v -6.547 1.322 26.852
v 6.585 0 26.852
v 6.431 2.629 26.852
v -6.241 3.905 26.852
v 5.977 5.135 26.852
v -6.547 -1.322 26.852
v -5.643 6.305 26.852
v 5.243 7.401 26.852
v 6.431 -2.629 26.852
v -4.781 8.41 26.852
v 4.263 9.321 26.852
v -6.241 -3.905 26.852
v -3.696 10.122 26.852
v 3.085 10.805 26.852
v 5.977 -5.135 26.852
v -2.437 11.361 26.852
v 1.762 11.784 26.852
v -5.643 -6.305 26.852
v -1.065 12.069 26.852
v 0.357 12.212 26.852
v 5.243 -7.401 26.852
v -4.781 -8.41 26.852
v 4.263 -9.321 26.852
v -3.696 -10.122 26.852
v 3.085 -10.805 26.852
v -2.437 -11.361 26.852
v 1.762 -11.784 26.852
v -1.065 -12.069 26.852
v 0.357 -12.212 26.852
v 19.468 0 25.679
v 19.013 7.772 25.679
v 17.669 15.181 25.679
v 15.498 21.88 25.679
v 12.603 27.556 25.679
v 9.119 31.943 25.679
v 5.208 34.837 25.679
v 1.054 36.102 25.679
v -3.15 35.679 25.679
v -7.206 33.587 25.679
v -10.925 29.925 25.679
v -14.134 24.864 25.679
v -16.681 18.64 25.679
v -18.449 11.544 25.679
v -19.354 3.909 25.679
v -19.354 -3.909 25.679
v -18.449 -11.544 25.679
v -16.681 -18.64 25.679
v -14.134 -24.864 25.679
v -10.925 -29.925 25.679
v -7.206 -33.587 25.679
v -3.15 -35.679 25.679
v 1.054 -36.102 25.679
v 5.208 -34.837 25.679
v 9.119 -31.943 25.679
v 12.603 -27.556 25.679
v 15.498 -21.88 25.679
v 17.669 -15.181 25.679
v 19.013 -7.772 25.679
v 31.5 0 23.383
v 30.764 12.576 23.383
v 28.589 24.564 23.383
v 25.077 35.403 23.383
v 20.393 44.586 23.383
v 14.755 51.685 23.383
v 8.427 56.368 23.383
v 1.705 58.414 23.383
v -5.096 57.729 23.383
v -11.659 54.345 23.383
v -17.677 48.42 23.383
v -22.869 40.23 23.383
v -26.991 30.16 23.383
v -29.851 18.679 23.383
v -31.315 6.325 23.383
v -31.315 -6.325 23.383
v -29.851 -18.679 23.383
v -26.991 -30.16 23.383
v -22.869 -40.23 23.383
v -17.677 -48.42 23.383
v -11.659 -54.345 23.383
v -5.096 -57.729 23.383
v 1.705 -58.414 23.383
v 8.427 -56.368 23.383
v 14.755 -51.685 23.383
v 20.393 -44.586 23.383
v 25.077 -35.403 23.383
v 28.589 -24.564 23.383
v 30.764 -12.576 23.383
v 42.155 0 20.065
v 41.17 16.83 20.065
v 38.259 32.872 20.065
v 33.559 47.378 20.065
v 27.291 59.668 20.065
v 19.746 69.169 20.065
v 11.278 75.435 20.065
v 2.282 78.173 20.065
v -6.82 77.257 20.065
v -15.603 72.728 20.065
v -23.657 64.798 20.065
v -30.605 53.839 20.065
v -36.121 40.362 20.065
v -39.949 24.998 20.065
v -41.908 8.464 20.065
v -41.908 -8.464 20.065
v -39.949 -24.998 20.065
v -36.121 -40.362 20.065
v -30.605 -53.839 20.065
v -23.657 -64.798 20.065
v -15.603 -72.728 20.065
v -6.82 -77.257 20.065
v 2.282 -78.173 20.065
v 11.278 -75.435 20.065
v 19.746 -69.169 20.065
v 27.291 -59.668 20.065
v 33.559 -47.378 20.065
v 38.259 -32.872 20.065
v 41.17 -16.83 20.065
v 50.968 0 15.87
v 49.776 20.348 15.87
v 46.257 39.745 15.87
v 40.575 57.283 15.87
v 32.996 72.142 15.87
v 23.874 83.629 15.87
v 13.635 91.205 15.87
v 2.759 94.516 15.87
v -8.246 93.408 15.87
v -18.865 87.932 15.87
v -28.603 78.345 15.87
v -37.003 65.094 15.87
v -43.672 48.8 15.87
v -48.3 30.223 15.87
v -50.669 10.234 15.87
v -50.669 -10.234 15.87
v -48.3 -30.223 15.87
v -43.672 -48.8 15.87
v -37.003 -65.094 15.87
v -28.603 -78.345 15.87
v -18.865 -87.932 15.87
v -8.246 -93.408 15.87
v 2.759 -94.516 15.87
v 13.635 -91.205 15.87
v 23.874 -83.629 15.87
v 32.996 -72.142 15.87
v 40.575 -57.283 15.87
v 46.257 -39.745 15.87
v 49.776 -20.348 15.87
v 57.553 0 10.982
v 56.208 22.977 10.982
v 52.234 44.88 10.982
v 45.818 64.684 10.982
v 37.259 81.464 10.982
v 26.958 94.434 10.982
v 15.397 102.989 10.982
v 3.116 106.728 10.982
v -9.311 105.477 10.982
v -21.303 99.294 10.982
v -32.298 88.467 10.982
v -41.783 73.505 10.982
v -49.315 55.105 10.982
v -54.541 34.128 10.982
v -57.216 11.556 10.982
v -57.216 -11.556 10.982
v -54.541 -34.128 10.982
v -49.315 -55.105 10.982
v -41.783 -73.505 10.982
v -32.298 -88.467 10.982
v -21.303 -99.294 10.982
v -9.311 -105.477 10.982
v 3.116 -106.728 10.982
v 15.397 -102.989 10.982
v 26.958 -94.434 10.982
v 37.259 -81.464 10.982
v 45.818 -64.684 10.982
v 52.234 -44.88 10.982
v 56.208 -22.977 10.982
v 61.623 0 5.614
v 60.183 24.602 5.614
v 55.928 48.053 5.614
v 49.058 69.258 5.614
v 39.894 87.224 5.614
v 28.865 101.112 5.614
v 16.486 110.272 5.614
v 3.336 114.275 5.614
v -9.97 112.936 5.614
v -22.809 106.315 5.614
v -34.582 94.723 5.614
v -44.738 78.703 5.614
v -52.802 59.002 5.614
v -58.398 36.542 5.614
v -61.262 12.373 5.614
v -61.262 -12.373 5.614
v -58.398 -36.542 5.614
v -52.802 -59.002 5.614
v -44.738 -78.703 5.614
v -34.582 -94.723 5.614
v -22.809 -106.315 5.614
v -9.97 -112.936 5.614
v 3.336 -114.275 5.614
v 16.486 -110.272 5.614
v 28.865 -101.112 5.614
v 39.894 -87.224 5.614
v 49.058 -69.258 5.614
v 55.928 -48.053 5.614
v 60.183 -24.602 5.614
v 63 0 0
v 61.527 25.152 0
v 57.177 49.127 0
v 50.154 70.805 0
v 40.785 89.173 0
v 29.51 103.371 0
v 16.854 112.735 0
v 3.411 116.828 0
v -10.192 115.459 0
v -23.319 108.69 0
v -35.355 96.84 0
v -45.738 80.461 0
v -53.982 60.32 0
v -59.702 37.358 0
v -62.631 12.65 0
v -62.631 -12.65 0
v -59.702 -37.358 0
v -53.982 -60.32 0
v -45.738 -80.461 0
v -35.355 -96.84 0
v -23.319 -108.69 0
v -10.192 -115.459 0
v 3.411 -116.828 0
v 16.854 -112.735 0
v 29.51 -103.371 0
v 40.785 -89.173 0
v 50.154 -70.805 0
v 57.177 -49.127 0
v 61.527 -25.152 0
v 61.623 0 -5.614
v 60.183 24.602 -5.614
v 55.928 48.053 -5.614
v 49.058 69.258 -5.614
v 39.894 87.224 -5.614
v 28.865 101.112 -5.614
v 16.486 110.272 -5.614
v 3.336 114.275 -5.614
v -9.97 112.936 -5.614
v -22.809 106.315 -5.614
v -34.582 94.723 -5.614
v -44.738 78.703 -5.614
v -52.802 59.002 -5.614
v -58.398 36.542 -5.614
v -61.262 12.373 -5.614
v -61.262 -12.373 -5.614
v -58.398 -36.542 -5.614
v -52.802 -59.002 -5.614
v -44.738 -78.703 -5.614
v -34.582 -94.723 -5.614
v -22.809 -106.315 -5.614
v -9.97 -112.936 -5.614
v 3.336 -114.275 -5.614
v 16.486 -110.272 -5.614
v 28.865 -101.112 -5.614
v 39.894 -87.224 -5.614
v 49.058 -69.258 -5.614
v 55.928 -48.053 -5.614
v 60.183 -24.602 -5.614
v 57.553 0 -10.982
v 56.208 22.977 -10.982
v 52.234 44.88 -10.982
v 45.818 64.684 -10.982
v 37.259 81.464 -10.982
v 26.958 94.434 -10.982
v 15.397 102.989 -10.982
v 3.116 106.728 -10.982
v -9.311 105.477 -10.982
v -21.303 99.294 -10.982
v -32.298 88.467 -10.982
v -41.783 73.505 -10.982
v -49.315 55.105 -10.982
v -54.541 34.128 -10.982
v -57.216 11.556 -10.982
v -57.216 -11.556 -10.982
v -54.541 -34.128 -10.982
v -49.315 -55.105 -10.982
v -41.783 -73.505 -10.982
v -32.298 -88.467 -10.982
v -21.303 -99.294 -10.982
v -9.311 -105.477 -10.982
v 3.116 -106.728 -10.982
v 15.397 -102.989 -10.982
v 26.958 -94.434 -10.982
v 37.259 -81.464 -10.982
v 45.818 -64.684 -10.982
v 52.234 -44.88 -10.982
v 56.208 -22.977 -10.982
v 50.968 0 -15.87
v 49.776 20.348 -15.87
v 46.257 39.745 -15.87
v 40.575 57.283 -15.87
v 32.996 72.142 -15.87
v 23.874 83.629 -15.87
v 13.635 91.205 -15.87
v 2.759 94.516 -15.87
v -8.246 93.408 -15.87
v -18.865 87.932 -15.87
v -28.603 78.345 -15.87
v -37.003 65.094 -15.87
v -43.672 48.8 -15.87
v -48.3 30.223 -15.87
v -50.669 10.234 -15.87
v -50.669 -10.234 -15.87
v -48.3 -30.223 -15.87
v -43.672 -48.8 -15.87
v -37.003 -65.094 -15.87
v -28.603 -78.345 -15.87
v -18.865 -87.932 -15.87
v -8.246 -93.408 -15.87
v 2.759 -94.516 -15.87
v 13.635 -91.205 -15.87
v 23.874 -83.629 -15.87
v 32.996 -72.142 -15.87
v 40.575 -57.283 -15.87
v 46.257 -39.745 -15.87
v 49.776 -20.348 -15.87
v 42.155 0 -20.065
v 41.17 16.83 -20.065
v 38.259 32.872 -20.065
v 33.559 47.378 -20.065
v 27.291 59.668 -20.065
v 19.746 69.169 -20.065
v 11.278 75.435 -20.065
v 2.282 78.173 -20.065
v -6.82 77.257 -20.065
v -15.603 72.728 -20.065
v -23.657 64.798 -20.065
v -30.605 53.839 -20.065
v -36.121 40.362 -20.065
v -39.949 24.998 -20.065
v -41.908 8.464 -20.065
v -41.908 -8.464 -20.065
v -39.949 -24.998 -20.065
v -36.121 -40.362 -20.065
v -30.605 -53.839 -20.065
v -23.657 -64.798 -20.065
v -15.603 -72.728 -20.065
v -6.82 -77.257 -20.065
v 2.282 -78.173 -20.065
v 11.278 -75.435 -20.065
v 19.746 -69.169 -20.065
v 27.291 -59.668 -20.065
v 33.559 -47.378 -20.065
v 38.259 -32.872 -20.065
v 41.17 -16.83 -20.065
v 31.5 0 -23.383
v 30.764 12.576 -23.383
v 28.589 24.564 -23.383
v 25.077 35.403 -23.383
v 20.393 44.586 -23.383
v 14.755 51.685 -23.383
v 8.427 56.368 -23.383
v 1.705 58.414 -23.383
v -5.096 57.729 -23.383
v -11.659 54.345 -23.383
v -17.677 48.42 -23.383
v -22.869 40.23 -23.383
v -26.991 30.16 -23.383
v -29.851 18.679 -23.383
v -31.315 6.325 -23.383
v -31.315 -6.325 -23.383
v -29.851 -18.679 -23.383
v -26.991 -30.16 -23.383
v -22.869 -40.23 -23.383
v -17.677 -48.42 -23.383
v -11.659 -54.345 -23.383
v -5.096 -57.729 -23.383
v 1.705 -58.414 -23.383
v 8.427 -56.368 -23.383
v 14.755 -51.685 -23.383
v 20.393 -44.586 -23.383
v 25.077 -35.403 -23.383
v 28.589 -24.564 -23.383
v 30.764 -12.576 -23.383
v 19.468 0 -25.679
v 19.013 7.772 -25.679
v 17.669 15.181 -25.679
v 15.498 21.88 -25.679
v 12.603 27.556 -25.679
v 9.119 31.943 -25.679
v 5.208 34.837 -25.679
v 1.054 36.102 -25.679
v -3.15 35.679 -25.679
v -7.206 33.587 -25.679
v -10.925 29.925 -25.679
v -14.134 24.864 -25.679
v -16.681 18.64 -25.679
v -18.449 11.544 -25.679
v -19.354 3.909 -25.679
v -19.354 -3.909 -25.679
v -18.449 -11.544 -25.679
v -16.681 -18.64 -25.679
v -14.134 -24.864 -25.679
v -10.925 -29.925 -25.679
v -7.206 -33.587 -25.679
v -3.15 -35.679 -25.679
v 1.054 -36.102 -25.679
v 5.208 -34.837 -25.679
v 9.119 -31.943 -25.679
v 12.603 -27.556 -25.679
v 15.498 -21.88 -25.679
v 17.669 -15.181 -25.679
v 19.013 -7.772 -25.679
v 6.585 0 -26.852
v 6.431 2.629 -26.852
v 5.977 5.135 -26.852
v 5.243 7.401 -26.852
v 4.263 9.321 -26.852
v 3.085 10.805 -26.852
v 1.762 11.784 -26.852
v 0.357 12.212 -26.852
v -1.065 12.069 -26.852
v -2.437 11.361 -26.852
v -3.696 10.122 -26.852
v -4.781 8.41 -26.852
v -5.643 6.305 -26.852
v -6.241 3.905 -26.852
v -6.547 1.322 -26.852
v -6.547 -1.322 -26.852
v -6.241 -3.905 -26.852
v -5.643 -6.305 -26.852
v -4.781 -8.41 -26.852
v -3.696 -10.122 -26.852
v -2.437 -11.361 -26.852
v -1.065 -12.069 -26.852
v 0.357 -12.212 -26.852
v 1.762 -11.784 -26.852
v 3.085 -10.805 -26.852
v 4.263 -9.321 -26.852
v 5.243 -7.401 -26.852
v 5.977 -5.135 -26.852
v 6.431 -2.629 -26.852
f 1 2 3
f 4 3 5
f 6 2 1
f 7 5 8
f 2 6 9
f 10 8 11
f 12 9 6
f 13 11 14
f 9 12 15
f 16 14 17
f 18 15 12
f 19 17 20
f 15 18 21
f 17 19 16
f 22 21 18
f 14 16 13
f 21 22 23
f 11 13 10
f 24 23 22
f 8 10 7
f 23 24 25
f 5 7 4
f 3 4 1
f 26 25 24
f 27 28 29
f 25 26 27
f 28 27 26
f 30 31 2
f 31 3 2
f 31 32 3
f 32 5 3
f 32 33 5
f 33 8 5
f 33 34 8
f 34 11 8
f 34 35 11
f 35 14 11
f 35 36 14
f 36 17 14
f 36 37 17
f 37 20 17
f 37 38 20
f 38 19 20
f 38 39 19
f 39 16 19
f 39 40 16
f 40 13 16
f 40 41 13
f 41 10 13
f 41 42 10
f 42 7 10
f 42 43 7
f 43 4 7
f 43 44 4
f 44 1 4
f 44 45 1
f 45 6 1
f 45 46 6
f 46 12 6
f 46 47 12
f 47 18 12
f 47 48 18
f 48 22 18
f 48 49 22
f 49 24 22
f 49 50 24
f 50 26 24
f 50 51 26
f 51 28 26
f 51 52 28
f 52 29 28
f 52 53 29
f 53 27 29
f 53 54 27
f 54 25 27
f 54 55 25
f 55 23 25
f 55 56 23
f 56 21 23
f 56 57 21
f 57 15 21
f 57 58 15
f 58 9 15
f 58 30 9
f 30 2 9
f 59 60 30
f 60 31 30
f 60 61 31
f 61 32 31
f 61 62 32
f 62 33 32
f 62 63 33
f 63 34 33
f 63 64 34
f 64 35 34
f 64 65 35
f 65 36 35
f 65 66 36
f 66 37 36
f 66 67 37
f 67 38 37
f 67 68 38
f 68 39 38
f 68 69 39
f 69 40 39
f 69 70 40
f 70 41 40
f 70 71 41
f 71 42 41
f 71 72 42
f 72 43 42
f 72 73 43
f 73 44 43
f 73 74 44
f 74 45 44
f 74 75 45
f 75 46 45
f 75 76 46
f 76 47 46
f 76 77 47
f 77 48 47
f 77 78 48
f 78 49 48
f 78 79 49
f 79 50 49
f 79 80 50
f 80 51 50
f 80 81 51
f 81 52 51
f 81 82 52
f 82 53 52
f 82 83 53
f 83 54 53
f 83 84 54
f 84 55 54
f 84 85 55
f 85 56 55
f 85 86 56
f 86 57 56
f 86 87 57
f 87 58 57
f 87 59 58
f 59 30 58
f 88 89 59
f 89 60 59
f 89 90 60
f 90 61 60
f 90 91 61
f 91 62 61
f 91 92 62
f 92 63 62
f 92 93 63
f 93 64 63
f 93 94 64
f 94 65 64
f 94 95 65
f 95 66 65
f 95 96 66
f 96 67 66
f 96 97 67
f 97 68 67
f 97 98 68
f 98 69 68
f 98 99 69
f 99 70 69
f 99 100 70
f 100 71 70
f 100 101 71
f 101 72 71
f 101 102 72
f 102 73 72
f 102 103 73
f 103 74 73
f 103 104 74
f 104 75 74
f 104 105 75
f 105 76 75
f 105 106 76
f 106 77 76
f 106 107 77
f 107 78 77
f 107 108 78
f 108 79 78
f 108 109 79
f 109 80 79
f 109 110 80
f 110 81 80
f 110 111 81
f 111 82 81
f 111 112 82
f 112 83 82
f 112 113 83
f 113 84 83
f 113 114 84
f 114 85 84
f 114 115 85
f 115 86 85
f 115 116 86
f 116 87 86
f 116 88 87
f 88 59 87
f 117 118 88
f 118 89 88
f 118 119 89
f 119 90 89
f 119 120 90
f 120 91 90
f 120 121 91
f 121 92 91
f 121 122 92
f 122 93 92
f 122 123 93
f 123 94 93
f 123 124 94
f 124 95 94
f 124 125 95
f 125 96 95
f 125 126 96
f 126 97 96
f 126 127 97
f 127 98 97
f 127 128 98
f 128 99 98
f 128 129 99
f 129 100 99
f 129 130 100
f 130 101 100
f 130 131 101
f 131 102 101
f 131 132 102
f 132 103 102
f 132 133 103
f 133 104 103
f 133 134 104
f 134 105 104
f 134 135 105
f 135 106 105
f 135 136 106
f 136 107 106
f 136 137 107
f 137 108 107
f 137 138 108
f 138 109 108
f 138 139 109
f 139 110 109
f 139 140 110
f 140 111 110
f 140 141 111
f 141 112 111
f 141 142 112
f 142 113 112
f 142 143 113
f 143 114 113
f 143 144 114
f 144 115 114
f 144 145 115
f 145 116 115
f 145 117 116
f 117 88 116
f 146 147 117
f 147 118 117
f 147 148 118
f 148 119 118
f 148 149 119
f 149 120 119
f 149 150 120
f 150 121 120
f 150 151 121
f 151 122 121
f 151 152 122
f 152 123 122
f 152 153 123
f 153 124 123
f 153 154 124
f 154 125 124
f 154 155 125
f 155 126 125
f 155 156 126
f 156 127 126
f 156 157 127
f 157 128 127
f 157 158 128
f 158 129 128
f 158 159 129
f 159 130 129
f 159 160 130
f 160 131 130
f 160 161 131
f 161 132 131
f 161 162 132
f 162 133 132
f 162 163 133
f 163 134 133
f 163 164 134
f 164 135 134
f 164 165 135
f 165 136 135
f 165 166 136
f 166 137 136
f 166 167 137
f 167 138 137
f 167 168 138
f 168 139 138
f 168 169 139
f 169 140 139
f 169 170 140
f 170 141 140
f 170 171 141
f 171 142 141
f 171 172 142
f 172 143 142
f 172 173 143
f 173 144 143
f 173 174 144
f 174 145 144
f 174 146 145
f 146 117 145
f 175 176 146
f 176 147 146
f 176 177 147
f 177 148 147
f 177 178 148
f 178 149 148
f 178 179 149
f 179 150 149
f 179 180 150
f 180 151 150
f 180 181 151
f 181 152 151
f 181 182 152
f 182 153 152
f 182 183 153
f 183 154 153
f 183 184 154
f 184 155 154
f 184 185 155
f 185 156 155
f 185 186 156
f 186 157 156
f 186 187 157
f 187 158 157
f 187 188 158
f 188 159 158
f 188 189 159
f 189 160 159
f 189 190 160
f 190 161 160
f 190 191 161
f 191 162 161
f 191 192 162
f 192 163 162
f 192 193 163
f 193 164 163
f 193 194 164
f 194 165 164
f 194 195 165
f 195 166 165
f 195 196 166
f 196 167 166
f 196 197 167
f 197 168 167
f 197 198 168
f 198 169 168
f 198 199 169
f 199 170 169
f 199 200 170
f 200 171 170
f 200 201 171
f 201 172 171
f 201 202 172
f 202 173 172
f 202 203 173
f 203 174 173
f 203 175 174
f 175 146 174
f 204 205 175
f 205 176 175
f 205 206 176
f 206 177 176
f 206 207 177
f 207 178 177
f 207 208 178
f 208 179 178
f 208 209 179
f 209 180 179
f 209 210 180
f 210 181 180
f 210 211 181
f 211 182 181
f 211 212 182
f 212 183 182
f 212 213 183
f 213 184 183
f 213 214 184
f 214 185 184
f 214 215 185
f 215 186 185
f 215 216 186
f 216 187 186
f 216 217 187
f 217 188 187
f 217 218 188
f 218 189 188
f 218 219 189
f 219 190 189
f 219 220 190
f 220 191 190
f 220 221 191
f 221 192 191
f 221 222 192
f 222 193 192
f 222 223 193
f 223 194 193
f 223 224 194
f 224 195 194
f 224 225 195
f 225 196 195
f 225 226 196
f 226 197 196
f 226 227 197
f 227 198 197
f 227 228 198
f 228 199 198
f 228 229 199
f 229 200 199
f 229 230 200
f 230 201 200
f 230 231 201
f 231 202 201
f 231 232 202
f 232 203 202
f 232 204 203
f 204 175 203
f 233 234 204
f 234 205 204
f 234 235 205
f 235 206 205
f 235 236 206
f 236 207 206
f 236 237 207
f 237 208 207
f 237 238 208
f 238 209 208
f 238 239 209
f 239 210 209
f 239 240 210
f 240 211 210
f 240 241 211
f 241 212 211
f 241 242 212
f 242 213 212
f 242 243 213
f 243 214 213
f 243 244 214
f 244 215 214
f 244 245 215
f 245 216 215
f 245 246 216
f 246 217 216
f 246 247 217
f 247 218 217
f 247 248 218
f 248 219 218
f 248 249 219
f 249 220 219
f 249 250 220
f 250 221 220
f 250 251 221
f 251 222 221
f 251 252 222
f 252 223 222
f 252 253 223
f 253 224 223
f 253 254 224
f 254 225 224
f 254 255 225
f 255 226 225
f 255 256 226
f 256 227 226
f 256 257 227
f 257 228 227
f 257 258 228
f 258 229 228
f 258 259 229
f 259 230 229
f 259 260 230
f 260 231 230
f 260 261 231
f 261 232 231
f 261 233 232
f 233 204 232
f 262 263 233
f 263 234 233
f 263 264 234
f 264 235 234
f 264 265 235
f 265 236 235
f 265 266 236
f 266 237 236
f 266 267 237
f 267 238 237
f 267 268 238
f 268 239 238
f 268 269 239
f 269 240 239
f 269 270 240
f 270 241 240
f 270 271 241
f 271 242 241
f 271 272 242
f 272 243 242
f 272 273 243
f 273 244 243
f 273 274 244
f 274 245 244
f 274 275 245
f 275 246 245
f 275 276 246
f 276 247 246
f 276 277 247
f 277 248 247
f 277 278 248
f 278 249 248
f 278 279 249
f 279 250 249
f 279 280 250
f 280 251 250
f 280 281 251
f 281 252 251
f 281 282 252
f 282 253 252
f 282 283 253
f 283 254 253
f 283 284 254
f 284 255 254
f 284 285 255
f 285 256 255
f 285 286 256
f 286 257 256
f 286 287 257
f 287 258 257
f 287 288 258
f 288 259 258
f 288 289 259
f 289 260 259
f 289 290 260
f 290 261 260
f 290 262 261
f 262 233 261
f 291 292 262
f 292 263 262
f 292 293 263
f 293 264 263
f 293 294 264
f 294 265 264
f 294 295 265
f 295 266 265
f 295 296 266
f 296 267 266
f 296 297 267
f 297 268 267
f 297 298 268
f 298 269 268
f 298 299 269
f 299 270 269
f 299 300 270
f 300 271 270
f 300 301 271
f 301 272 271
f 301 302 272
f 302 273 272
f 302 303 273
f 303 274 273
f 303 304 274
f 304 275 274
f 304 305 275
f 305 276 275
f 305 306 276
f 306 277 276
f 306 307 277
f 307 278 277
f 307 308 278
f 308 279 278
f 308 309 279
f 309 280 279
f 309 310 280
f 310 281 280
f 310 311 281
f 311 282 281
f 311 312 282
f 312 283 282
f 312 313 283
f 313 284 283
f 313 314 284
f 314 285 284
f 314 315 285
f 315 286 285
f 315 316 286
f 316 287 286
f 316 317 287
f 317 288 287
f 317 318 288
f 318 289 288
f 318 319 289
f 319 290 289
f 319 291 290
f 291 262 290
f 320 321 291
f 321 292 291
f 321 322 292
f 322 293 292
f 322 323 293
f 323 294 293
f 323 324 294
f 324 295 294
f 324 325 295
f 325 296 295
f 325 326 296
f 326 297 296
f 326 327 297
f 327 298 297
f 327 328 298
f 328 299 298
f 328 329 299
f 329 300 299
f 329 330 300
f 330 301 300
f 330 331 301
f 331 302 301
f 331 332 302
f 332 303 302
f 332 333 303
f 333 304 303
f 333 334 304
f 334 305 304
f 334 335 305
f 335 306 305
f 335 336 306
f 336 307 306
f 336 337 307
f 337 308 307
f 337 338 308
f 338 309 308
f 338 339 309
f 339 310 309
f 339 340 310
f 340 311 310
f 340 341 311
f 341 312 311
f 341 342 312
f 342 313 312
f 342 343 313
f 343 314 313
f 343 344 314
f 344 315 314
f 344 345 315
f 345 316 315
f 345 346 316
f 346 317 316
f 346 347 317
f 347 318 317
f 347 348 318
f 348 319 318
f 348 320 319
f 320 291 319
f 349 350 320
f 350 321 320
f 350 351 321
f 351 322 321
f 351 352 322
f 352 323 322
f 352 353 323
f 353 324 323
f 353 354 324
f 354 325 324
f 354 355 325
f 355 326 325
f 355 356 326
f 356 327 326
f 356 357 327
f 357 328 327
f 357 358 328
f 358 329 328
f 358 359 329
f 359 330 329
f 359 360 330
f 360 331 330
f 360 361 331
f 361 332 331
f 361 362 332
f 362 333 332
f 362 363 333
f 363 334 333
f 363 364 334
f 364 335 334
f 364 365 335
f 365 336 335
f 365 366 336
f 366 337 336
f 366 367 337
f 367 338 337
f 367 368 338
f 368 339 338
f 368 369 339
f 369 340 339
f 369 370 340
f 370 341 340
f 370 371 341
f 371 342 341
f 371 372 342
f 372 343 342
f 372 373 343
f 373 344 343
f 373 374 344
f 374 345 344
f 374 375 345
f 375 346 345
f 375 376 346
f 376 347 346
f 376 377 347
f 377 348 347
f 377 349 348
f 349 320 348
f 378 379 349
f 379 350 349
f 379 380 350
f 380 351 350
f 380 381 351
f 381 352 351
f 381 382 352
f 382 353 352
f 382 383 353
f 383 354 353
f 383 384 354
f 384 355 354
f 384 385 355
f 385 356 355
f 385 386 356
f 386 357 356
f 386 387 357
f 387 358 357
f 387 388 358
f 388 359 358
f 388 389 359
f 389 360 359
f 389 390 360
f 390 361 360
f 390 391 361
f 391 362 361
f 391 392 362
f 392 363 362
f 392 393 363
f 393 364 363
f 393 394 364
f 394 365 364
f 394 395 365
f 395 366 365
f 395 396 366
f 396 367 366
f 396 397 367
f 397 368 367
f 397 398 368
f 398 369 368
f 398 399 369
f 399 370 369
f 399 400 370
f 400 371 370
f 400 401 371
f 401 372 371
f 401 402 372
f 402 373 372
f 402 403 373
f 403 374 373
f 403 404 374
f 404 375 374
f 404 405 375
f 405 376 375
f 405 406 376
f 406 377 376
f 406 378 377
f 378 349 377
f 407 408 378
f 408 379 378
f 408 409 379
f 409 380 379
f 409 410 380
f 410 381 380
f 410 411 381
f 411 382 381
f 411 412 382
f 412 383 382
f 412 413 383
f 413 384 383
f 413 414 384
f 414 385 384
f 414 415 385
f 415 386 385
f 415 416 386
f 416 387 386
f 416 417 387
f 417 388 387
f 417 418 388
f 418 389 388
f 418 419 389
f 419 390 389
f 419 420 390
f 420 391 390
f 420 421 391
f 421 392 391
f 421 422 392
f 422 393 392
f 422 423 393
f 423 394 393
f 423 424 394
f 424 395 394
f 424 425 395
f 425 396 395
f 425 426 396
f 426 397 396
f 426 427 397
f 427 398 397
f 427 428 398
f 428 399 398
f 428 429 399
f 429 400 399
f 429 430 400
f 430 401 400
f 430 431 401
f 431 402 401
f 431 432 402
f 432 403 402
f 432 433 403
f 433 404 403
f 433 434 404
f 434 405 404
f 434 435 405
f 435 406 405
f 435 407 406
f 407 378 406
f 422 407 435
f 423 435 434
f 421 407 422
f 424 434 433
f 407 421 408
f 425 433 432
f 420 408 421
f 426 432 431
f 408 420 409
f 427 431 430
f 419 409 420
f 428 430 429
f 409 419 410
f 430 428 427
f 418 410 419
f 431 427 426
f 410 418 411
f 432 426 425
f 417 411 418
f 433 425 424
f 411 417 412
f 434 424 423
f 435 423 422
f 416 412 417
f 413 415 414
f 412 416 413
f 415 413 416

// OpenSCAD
// Generated by SolidPython 1.0.1 on 2020-07-29 00:46:47


scale(v = [7, 13, 3]) {
	sphere(r = 9);
}
/***********************************************
*********      SolidPython code:      **********
************************************************
 
# import packages: SolidPython
from solid import *
from solid.utils import *
from itertools import chain, combinations, permutations


class Resize:

    def __init__(self, scad_file):
        self.scad_file = scad_file
        #self.scad_file = import_scad(scad_file)
        # cone/cylinder param:
        self.r1 = 0
        self.r2 = 0
        self.h = 0
        # rectangular prism param:
        self.w = 0
        self.l = 0
        # ellipse param:
        self.r = 0

    # import OpenScad code (file name corresponds to shape)


    # classify shape + parameters
    def assign(self, param1, param2, param3):
        if self.scad_file == 'cone.scad':
            self.r1 = param1
            self.r2 = param2
            self.h = param3
        elif self.scad_file == 'cylinder.scad':
            self.r1 = param1
            self.r2 = param2
            self.h = param3
        elif self.scad_file == 'rectangularPrism.scad':
            self.h = param1
            self.l = param2
            self.w = param3
        else:
            self.r = param1
            self.h = param2

    # resize parameters
    def iterate(self):
        x = range(3, 20, 2)
        i = 1
        if self.scad_file == 'cone.scad':
            tempList = list(permutations(x, 2))
            for temp in tempList:
                param1 = temp[0]
                param2 = temp[1]
                filepath = 'produced_scad_files/' + 'cone' + str(param1) + '_' + str(param2) + '_' + '.scad'
                scad_render_to_file(cylinder(h=param1, r1=param2, r2=0), filepath)

        elif self.scad_file == 'cylinder.scad':
            tempList = list(permutations(x, 3))
            for temp in tempList:
                param1 = temp[0]
                param2 = temp[1]
                filepath = 'produced_scad_files/' + 'cylinder' + str(param1) + '_' + str(param2) + '_' + '.scad'
                scad_render_to_file(cylinder(h=param1, r1=param2, r2=param2), filepath)

        elif self.scad_file == 'rectangularPrism.scad':
            tempList = list(permutations(x, 3))
            for temp in tempList:
                param1 = temp[0]
                param2 = temp[1]
                param3 = temp[2]
                filepath = 'produced_scad_files/' + 'rectangularPrism' + str(param1) + '_' + str(param2) + '_' + str(
                    param3) + '.scad'
                scad_render_to_file(cube(size=(param1, param2, param3)), filepath)

        elif self.scad_file == 'ellipse.scad':
            tempList = list(permutations(x, 4))
            for temp in tempList:
                param1 = temp[0]
                param2 = temp[1]
                param3 = temp[2]
                param4 = temp[3]
                filepath = 'produced_scad_files/' + 'ellipse' + str(param1) + '_' + str(param2) + '_' + str(param3) + '_' + str(param4) + '.scad'
                scad_render_to_file(scale([param1, param2, param3])(sphere(r=param4)), filepath)

    def render_to_scadfile(self):
        scad_render_to_file(scad, 'example.scad') 
 
************************************************/
